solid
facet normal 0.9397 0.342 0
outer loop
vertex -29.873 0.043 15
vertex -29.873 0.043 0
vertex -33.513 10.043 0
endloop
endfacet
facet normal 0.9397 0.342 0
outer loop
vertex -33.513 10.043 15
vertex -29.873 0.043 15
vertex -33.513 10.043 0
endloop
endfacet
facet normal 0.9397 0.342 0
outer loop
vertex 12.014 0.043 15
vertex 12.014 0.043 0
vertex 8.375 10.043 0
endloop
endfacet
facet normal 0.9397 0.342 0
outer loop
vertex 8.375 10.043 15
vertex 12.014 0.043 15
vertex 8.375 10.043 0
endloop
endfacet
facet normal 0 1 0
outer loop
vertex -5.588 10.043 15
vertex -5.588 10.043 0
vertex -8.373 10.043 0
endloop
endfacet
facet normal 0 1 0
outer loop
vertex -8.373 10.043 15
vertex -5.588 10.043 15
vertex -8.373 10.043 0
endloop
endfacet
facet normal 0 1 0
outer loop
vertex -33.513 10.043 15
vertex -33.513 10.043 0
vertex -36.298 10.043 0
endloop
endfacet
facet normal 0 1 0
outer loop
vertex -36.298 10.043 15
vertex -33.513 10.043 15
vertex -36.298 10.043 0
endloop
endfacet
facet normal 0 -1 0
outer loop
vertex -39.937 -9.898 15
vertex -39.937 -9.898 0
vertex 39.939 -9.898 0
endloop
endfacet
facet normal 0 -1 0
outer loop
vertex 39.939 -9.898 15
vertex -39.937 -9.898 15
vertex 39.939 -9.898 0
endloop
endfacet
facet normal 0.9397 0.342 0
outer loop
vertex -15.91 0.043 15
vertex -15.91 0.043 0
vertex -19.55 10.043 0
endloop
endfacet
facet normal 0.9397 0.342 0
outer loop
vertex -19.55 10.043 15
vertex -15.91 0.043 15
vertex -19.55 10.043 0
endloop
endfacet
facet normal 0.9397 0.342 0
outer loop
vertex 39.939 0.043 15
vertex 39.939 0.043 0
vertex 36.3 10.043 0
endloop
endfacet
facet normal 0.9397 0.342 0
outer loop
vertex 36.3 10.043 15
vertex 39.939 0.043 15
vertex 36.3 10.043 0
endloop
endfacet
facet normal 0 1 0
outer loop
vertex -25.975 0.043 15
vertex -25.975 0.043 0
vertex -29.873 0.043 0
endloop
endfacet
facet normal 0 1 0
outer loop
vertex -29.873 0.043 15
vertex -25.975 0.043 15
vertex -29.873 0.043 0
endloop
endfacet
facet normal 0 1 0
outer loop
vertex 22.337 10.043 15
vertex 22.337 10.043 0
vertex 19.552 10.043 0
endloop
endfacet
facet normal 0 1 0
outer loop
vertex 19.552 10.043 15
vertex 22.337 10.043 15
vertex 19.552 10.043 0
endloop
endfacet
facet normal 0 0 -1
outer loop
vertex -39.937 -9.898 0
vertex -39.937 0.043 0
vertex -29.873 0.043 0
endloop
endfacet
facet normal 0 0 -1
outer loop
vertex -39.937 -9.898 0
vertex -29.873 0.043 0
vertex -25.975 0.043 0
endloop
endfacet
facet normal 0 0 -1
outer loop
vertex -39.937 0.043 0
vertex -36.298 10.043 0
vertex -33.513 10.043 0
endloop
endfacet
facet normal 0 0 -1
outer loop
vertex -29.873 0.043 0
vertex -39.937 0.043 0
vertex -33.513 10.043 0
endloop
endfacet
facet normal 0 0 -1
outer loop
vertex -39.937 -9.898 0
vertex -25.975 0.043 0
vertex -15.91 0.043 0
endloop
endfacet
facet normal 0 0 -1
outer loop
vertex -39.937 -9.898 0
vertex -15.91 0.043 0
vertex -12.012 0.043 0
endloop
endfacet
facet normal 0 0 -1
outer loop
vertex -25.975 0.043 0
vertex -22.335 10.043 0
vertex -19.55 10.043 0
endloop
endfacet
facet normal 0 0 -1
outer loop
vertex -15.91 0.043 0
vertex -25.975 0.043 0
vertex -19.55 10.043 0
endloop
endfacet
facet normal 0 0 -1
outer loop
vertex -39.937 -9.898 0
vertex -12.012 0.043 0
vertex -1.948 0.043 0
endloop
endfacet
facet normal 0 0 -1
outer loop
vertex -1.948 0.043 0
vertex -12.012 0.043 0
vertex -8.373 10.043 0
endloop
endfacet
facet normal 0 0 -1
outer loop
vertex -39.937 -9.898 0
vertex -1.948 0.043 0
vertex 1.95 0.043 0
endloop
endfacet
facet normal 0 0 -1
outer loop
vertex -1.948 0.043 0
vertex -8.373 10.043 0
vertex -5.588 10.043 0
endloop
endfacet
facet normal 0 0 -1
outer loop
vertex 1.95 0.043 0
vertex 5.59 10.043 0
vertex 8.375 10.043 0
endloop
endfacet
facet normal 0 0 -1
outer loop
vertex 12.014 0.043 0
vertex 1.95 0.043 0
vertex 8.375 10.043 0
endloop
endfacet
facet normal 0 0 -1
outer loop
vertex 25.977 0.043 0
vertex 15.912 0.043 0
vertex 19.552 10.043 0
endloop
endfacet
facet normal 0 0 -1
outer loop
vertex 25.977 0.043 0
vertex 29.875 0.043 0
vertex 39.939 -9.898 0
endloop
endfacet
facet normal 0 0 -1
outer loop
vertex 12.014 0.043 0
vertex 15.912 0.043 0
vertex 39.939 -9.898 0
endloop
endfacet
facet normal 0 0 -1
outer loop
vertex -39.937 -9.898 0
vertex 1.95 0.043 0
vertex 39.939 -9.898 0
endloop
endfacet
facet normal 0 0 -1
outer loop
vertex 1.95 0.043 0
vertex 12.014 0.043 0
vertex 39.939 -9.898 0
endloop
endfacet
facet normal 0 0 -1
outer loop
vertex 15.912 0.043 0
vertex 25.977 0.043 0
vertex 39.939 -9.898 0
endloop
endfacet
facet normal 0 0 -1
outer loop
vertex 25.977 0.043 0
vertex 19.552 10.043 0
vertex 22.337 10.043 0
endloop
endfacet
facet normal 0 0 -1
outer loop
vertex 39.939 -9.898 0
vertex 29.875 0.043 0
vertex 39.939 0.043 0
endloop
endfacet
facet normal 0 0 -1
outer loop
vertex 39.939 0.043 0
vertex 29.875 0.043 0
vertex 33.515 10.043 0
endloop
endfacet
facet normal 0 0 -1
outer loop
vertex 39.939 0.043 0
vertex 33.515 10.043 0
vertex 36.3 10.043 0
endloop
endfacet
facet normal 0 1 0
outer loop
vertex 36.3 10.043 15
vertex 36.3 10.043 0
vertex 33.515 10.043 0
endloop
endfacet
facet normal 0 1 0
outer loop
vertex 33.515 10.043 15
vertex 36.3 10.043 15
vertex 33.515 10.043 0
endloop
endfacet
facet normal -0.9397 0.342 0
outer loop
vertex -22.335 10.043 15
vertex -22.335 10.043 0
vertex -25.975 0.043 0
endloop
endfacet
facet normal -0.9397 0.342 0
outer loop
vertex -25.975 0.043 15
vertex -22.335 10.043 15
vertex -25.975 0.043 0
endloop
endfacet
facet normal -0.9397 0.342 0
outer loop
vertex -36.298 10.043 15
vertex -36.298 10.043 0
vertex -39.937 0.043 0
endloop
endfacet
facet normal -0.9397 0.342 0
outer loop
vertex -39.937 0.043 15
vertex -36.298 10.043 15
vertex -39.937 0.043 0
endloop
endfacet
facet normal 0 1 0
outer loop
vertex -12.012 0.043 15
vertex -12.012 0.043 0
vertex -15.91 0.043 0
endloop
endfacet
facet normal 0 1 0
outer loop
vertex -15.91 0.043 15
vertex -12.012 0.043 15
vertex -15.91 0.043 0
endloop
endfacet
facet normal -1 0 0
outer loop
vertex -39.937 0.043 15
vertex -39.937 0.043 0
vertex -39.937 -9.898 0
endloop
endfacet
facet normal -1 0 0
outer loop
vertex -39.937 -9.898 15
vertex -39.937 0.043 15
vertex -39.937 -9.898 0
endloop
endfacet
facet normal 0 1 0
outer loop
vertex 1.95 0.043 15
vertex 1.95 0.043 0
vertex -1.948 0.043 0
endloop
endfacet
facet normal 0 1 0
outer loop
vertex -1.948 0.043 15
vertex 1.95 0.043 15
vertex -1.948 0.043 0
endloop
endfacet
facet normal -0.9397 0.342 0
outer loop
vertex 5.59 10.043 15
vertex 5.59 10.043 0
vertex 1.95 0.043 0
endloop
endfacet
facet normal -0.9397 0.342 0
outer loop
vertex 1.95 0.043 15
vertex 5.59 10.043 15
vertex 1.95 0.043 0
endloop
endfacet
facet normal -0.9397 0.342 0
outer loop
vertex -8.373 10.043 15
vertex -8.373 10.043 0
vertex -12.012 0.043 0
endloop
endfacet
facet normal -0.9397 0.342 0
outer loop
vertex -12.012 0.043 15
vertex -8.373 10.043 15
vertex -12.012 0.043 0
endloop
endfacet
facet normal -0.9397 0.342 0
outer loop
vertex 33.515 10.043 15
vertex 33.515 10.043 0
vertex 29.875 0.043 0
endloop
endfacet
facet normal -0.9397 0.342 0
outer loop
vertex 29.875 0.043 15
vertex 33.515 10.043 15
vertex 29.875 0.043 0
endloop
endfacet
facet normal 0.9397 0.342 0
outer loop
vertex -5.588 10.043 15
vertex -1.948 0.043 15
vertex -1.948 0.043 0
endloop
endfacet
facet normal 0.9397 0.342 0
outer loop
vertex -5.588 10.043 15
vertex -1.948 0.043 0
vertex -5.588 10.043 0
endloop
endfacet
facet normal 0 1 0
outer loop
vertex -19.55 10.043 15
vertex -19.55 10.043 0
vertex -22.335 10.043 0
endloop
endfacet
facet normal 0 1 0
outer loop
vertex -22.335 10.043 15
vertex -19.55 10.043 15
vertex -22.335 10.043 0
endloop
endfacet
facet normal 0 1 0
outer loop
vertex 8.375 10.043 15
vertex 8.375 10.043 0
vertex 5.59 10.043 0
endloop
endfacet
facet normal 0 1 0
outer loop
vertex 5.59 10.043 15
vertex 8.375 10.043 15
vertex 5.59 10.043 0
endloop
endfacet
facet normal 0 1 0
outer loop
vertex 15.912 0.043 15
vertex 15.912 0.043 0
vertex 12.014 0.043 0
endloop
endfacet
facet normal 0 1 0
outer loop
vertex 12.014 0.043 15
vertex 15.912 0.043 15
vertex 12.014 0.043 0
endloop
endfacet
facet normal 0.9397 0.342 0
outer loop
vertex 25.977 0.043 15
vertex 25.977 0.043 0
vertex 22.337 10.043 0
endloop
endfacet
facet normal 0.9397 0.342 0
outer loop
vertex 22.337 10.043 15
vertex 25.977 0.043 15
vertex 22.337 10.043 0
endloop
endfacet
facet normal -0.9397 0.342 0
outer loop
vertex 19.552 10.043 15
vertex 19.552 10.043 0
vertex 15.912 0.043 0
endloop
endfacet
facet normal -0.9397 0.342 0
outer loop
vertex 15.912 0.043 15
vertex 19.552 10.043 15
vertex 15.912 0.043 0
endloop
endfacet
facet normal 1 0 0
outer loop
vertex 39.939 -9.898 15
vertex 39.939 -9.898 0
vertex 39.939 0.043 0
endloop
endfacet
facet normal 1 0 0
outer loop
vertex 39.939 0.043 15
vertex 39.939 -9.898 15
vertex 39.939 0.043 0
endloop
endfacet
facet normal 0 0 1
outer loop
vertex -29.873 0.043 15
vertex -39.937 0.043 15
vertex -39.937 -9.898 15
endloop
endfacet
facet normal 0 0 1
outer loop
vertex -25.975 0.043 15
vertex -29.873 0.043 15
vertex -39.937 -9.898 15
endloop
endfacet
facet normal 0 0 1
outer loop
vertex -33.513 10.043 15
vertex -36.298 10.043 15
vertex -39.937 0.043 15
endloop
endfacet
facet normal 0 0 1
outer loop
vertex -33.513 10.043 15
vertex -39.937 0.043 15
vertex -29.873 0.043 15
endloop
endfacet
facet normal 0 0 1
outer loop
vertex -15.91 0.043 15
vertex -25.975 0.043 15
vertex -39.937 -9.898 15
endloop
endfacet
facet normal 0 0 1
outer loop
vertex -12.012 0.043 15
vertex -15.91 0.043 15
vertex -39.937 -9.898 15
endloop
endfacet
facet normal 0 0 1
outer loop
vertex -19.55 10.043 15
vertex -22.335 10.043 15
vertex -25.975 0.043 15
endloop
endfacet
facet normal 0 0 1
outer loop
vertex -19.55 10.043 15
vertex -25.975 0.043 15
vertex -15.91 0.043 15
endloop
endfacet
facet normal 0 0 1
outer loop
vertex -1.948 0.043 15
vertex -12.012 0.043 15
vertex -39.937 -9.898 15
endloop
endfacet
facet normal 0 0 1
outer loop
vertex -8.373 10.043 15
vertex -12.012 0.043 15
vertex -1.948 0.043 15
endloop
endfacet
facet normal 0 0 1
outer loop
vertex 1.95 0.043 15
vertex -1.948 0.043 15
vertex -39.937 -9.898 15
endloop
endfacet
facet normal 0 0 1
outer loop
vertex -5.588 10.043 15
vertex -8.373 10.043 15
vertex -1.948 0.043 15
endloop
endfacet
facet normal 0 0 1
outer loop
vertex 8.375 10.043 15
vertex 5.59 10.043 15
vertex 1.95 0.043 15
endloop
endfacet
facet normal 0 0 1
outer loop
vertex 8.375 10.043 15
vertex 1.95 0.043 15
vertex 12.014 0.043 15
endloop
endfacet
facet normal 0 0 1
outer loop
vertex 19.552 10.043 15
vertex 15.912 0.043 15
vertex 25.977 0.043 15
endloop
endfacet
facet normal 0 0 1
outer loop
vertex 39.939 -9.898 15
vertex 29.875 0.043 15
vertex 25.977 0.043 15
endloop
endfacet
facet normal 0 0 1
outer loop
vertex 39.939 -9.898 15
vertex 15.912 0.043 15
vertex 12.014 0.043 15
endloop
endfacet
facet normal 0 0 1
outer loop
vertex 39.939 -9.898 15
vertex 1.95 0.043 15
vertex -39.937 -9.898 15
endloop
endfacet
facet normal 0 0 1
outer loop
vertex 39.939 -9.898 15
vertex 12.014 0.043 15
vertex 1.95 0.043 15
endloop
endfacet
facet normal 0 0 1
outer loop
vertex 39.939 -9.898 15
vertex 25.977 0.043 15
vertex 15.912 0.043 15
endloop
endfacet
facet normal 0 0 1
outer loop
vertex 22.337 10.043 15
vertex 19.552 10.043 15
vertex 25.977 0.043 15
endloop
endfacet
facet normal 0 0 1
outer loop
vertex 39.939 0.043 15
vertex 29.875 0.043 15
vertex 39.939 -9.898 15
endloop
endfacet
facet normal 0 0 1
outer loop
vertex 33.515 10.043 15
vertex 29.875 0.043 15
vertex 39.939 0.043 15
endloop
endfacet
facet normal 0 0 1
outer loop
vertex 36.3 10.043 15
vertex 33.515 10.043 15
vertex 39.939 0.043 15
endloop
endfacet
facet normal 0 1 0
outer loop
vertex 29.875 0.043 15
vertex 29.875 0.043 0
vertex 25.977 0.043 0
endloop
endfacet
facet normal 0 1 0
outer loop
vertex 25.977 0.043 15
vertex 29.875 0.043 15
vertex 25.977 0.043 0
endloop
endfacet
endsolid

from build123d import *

# Parameters (mm, degrees)
F1_DEPTH = 15


with BuildPart() as f1:
    # F0 (on Top) → F1 (new body)
    with BuildSketch(Plane.XY):
        Polygon((5.589702, 10.04253), (1.95, 0.04253), (-1.948, 0.04253), (-5.587702, 10.04253), (-8.372702, 10.04253), (-12.012405, 0.04253), (-15.910405, 0.04253), (-19.550107, 10.04253), (-22.335107, 10.04253), (-25.974809, 0.04253), (-29.872809, 0.04253), (-33.512512, 10.04253), (-36.297512, 10.04253), (-39.937214, 0.04253), (-39.937214, -9.898053), (39.939214, -9.898053), (39.939214, 0.04253), (36.299512, 10.04253), (33.514512, 10.04253), (29.874809, 0.04253), (25.976809, 0.04253), (22.337107, 10.04253), (19.552107, 10.04253), (15.912405, 0.04253), (12.014405, 0.04253), (8.374702, 10.04253), align=None)
    extrude(amount=F1_DEPTH)


solid = f1.part
